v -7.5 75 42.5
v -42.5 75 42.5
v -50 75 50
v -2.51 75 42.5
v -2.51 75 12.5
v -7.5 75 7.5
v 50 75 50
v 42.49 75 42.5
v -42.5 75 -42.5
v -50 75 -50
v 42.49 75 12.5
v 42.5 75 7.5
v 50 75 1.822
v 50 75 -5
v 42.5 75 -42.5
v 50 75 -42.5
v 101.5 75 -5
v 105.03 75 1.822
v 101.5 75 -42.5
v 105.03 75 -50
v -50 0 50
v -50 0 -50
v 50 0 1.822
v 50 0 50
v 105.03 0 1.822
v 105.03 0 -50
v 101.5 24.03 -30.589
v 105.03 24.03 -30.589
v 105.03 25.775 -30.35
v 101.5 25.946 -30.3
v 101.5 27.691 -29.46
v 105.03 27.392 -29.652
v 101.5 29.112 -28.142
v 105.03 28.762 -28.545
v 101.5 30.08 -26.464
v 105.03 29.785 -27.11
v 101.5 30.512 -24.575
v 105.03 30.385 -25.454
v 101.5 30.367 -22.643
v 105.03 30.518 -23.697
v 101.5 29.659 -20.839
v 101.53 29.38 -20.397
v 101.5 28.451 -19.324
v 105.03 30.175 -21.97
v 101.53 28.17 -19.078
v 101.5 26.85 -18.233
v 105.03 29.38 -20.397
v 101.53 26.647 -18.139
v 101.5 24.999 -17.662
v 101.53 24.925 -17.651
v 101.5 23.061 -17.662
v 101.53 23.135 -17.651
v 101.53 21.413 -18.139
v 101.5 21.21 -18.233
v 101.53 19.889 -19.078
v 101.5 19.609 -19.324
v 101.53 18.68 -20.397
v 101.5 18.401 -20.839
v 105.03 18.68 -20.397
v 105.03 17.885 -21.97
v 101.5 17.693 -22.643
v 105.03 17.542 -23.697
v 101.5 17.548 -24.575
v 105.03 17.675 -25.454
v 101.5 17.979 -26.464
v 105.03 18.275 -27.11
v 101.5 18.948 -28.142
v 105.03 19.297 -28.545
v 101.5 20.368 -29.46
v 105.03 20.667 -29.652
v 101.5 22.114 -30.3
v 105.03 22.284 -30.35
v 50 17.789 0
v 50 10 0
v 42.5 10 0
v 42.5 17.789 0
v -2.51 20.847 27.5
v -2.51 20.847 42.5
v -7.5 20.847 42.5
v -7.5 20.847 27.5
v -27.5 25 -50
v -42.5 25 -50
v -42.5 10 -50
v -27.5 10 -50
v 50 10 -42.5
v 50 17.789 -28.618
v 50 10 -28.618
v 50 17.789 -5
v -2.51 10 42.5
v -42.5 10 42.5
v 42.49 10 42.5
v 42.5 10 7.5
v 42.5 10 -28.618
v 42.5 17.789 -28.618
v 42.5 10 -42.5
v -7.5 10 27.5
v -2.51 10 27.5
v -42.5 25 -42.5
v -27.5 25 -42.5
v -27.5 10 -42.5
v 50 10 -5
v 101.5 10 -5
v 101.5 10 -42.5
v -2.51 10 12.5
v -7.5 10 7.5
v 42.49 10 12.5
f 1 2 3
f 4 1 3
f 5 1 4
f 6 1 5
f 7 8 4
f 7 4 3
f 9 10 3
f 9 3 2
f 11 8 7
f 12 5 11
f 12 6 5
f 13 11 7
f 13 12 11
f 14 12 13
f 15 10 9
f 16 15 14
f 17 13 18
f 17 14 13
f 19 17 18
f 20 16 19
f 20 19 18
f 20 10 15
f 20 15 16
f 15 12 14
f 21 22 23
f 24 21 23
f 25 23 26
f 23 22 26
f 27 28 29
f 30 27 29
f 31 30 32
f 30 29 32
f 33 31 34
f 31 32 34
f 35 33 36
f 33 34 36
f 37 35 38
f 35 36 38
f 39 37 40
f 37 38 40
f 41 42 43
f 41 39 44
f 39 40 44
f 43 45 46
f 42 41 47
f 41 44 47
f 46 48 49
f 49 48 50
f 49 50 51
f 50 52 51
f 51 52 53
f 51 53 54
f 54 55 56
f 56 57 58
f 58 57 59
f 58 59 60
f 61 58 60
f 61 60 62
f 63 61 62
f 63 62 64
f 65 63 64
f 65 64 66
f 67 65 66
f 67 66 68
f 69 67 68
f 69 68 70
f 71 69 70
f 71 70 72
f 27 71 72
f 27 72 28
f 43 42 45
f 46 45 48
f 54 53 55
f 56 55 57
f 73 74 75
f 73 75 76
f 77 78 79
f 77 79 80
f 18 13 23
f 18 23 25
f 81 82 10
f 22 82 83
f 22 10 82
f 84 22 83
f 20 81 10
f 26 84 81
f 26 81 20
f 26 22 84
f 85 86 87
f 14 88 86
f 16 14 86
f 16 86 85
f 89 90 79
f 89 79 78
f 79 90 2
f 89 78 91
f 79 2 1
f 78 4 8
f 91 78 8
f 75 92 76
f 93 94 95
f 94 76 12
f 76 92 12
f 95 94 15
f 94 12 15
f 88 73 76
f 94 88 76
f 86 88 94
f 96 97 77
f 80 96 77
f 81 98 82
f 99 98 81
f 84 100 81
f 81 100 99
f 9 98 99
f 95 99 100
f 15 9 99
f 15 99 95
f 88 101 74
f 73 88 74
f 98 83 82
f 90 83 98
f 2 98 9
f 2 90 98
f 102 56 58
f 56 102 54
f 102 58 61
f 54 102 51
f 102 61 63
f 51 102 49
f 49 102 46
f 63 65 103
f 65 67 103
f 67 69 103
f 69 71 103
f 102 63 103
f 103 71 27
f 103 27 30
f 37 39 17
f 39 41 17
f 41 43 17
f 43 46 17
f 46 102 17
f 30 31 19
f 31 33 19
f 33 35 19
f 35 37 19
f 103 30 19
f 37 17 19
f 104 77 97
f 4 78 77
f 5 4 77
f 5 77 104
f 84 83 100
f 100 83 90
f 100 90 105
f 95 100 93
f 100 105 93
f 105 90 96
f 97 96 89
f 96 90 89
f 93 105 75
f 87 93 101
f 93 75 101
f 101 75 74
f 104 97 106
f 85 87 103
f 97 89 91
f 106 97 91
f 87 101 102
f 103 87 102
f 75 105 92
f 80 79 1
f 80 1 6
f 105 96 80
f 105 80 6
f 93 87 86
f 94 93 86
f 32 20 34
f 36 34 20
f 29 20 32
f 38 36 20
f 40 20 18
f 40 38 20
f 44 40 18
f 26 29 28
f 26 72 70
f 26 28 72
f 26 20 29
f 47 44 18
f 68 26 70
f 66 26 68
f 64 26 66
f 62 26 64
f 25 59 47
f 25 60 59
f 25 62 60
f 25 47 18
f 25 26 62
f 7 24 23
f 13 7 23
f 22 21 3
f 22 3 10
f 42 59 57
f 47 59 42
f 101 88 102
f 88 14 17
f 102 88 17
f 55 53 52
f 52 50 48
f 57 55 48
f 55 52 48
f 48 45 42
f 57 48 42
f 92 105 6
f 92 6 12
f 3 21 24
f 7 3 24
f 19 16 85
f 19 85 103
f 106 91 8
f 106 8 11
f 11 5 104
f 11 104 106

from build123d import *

# Parameters (mm, degrees)
CROQUIS2_W                 = 100
CROQUIS2_H                 = 100
SALIENTE_EXTRUIR1_DEPTH    = 75
CROQUIS3_W                 = 85
CROQUIS3_H                 = 85
CORTAR_EXTRUIR1_DEPTH      = 65
CROQUIS4_W                 = 50
CROQUIS4_H                 = 35
SALIENTE_EXTRUIR2_DEPTH    = 65
CROQUIS5_W                 = 45
CROQUIS5_H                 = 30
CORTAR_EXTRUIR2_DEPTH      = 1
CORTAR_EXTRUIR2_DEPTH_BACK = 65
CROQUIS6_W                 = 15
CROQUIS6_H                 = 10.846969935
CORTAR_EXTRUIR3_DEPTH      = 16
CROQUIS7_W                 = 28.617843409
CROQUIS7_H                 = 7.788560798
CORTAR_EXTRUIR4_DEPTH      = 11
CROQUIS8_W                 = 55.029985219
CROQUIS8_H                 = 51.821882126
SALIENTE_EXTRUIR3_DEPTH    = 75
CROQUIS9_W                 = 51.5
CROQUIS9_H                 = 37.5
CORTAR_EXTRUIR5_DEPTH      = 65
CROQUIS10_R                = 6.5
CORTAR_EXTRUIR6_DEPTH      = 43
CROQUIS11_W                = 5.616805414
CROQUIS11_H                = 14.360656008
SALIENTE_EXTRUIR9_DEPTH    = 3.5
CROQUIS12_W                = 15
CROQUIS12_H                = 15
CORTAR_EXTRUIR7_DEPTH      = 10


with BuildPart() as part:
    # Croquis2 → Saliente-Extruir1 (new body)
    with BuildSketch(Plane(origin=(0, 0, 0), x_dir=(1, 0, 0), z_dir=(0, 1, 0))):
        Rectangle(CROQUIS2_W, CROQUIS2_H)
    extrude(amount=SALIENTE_EXTRUIR1_DEPTH)

    # Croquis3 → Cortar-Extruir1 (cut)
    with BuildSketch(Plane(origin=(0, 75, 0), x_dir=(1, 0, 0), z_dir=(0, 1, 0))):
        Rectangle(CROQUIS3_W, CROQUIS3_H)
    extrude(amount=-CORTAR_EXTRUIR1_DEPTH, mode=Mode.SUBTRACT)

    # Croquis4 → Saliente-Extruir2 (add, through all)
    with BuildSketch(Plane(origin=(0, 10, 0), x_dir=(1, 0, 0), z_dir=(0, 1, 0))):
        with Locations((17.5, -25)):
            Rectangle(CROQUIS4_W, CROQUIS4_H)
    extrude(amount=SALIENTE_EXTRUIR2_DEPTH)

    # Croquis5 → Cortar-Extruir2 (cut, two sides)
    with BuildSketch(Plane(origin=(0, 75, 0), x_dir=(1, 0, 0), z_dir=(0, 1, 0))) as cortar_extruir2_sk:
        with Locations((19.989777708, -27.5)):
            Rectangle(CROQUIS5_W, CROQUIS5_H)
    extrude(amount=CORTAR_EXTRUIR2_DEPTH, mode=Mode.SUBTRACT)
    extrude(cortar_extruir2_sk.sketch, amount=-CORTAR_EXTRUIR2_DEPTH_BACK, mode=Mode.SUBTRACT)

    # Croquis6 → Cortar-Extruir3 (cut)
    with BuildSketch(Plane(origin=(-2.510222292, 0, 0), x_dir=(0, 0, -1), z_dir=(1, 0, 0))):
        with Locations((-35, 15.423484968)):
            Rectangle(CROQUIS6_W, CROQUIS6_H)
    extrude(amount=-CORTAR_EXTRUIR3_DEPTH, mode=Mode.SUBTRACT)

    # Croquis7 → Cortar-Extruir4 (cut)
    with BuildSketch(Plane(origin=(50, 0, 0), x_dir=(0, 0, -1), z_dir=(1, 0, 0))):
        with Locations((14.308921705, 13.894280399)):
            Rectangle(CROQUIS7_W, CROQUIS7_H)
    extrude(amount=-CORTAR_EXTRUIR4_DEPTH, mode=Mode.SUBTRACT)

    # Croquis8 → Saliente-Extruir3 (add, through all)
    with BuildSketch(Plane.XZ):
        with Locations((77.51499261, -24.089058937)):
            Rectangle(CROQUIS8_W, CROQUIS8_H)
    extrude(amount=-SALIENTE_EXTRUIR3_DEPTH)

    # Croquis9 → Cortar-Extruir5 (cut)
    with BuildSketch(Plane(origin=(0, 75, 0), x_dir=(1, 0, 0), z_dir=(0, 1, 0))):
        with Locations((75.75, 23.75)):
            Rectangle(CROQUIS9_W, CROQUIS9_H)
    extrude(amount=-CORTAR_EXTRUIR5_DEPTH, mode=Mode.SUBTRACT)

    # Croquis10 → Cortar-Extruir6 (cut)
    with BuildSketch(Plane(origin=(105.029985219, 0, 0), x_dir=(0, 0, -1), z_dir=(1, 0, 0))):
        with Locations((24.089058937, 24.029815949)):
            Circle(CROQUIS10_R)
    extrude(amount=-CORTAR_EXTRUIR6_DEPTH, mode=Mode.SUBTRACT)

    # Croquis11 → Saliente-Extruir9 (add)
    with BuildSketch(Plane(origin=(105.029985219, 0, 0), x_dir=(0, 0, -1), z_dir=(1, 0, 0))):
        with Locations((17.589058937, 24.029815949)):
            Rectangle(CROQUIS11_W, CROQUIS11_H)
    extrude(amount=-SALIENTE_EXTRUIR9_DEPTH)

    # Croquis12 → Cortar-Extruir7 (cut)
    with BuildSketch(Plane.XY.offset(-42.5)):
        with Locations((-35, 17.5)):
            Rectangle(CROQUIS12_W, CROQUIS12_H)
    extrude(amount=-CORTAR_EXTRUIR7_DEPTH, mode=Mode.SUBTRACT)


solid = part.part
